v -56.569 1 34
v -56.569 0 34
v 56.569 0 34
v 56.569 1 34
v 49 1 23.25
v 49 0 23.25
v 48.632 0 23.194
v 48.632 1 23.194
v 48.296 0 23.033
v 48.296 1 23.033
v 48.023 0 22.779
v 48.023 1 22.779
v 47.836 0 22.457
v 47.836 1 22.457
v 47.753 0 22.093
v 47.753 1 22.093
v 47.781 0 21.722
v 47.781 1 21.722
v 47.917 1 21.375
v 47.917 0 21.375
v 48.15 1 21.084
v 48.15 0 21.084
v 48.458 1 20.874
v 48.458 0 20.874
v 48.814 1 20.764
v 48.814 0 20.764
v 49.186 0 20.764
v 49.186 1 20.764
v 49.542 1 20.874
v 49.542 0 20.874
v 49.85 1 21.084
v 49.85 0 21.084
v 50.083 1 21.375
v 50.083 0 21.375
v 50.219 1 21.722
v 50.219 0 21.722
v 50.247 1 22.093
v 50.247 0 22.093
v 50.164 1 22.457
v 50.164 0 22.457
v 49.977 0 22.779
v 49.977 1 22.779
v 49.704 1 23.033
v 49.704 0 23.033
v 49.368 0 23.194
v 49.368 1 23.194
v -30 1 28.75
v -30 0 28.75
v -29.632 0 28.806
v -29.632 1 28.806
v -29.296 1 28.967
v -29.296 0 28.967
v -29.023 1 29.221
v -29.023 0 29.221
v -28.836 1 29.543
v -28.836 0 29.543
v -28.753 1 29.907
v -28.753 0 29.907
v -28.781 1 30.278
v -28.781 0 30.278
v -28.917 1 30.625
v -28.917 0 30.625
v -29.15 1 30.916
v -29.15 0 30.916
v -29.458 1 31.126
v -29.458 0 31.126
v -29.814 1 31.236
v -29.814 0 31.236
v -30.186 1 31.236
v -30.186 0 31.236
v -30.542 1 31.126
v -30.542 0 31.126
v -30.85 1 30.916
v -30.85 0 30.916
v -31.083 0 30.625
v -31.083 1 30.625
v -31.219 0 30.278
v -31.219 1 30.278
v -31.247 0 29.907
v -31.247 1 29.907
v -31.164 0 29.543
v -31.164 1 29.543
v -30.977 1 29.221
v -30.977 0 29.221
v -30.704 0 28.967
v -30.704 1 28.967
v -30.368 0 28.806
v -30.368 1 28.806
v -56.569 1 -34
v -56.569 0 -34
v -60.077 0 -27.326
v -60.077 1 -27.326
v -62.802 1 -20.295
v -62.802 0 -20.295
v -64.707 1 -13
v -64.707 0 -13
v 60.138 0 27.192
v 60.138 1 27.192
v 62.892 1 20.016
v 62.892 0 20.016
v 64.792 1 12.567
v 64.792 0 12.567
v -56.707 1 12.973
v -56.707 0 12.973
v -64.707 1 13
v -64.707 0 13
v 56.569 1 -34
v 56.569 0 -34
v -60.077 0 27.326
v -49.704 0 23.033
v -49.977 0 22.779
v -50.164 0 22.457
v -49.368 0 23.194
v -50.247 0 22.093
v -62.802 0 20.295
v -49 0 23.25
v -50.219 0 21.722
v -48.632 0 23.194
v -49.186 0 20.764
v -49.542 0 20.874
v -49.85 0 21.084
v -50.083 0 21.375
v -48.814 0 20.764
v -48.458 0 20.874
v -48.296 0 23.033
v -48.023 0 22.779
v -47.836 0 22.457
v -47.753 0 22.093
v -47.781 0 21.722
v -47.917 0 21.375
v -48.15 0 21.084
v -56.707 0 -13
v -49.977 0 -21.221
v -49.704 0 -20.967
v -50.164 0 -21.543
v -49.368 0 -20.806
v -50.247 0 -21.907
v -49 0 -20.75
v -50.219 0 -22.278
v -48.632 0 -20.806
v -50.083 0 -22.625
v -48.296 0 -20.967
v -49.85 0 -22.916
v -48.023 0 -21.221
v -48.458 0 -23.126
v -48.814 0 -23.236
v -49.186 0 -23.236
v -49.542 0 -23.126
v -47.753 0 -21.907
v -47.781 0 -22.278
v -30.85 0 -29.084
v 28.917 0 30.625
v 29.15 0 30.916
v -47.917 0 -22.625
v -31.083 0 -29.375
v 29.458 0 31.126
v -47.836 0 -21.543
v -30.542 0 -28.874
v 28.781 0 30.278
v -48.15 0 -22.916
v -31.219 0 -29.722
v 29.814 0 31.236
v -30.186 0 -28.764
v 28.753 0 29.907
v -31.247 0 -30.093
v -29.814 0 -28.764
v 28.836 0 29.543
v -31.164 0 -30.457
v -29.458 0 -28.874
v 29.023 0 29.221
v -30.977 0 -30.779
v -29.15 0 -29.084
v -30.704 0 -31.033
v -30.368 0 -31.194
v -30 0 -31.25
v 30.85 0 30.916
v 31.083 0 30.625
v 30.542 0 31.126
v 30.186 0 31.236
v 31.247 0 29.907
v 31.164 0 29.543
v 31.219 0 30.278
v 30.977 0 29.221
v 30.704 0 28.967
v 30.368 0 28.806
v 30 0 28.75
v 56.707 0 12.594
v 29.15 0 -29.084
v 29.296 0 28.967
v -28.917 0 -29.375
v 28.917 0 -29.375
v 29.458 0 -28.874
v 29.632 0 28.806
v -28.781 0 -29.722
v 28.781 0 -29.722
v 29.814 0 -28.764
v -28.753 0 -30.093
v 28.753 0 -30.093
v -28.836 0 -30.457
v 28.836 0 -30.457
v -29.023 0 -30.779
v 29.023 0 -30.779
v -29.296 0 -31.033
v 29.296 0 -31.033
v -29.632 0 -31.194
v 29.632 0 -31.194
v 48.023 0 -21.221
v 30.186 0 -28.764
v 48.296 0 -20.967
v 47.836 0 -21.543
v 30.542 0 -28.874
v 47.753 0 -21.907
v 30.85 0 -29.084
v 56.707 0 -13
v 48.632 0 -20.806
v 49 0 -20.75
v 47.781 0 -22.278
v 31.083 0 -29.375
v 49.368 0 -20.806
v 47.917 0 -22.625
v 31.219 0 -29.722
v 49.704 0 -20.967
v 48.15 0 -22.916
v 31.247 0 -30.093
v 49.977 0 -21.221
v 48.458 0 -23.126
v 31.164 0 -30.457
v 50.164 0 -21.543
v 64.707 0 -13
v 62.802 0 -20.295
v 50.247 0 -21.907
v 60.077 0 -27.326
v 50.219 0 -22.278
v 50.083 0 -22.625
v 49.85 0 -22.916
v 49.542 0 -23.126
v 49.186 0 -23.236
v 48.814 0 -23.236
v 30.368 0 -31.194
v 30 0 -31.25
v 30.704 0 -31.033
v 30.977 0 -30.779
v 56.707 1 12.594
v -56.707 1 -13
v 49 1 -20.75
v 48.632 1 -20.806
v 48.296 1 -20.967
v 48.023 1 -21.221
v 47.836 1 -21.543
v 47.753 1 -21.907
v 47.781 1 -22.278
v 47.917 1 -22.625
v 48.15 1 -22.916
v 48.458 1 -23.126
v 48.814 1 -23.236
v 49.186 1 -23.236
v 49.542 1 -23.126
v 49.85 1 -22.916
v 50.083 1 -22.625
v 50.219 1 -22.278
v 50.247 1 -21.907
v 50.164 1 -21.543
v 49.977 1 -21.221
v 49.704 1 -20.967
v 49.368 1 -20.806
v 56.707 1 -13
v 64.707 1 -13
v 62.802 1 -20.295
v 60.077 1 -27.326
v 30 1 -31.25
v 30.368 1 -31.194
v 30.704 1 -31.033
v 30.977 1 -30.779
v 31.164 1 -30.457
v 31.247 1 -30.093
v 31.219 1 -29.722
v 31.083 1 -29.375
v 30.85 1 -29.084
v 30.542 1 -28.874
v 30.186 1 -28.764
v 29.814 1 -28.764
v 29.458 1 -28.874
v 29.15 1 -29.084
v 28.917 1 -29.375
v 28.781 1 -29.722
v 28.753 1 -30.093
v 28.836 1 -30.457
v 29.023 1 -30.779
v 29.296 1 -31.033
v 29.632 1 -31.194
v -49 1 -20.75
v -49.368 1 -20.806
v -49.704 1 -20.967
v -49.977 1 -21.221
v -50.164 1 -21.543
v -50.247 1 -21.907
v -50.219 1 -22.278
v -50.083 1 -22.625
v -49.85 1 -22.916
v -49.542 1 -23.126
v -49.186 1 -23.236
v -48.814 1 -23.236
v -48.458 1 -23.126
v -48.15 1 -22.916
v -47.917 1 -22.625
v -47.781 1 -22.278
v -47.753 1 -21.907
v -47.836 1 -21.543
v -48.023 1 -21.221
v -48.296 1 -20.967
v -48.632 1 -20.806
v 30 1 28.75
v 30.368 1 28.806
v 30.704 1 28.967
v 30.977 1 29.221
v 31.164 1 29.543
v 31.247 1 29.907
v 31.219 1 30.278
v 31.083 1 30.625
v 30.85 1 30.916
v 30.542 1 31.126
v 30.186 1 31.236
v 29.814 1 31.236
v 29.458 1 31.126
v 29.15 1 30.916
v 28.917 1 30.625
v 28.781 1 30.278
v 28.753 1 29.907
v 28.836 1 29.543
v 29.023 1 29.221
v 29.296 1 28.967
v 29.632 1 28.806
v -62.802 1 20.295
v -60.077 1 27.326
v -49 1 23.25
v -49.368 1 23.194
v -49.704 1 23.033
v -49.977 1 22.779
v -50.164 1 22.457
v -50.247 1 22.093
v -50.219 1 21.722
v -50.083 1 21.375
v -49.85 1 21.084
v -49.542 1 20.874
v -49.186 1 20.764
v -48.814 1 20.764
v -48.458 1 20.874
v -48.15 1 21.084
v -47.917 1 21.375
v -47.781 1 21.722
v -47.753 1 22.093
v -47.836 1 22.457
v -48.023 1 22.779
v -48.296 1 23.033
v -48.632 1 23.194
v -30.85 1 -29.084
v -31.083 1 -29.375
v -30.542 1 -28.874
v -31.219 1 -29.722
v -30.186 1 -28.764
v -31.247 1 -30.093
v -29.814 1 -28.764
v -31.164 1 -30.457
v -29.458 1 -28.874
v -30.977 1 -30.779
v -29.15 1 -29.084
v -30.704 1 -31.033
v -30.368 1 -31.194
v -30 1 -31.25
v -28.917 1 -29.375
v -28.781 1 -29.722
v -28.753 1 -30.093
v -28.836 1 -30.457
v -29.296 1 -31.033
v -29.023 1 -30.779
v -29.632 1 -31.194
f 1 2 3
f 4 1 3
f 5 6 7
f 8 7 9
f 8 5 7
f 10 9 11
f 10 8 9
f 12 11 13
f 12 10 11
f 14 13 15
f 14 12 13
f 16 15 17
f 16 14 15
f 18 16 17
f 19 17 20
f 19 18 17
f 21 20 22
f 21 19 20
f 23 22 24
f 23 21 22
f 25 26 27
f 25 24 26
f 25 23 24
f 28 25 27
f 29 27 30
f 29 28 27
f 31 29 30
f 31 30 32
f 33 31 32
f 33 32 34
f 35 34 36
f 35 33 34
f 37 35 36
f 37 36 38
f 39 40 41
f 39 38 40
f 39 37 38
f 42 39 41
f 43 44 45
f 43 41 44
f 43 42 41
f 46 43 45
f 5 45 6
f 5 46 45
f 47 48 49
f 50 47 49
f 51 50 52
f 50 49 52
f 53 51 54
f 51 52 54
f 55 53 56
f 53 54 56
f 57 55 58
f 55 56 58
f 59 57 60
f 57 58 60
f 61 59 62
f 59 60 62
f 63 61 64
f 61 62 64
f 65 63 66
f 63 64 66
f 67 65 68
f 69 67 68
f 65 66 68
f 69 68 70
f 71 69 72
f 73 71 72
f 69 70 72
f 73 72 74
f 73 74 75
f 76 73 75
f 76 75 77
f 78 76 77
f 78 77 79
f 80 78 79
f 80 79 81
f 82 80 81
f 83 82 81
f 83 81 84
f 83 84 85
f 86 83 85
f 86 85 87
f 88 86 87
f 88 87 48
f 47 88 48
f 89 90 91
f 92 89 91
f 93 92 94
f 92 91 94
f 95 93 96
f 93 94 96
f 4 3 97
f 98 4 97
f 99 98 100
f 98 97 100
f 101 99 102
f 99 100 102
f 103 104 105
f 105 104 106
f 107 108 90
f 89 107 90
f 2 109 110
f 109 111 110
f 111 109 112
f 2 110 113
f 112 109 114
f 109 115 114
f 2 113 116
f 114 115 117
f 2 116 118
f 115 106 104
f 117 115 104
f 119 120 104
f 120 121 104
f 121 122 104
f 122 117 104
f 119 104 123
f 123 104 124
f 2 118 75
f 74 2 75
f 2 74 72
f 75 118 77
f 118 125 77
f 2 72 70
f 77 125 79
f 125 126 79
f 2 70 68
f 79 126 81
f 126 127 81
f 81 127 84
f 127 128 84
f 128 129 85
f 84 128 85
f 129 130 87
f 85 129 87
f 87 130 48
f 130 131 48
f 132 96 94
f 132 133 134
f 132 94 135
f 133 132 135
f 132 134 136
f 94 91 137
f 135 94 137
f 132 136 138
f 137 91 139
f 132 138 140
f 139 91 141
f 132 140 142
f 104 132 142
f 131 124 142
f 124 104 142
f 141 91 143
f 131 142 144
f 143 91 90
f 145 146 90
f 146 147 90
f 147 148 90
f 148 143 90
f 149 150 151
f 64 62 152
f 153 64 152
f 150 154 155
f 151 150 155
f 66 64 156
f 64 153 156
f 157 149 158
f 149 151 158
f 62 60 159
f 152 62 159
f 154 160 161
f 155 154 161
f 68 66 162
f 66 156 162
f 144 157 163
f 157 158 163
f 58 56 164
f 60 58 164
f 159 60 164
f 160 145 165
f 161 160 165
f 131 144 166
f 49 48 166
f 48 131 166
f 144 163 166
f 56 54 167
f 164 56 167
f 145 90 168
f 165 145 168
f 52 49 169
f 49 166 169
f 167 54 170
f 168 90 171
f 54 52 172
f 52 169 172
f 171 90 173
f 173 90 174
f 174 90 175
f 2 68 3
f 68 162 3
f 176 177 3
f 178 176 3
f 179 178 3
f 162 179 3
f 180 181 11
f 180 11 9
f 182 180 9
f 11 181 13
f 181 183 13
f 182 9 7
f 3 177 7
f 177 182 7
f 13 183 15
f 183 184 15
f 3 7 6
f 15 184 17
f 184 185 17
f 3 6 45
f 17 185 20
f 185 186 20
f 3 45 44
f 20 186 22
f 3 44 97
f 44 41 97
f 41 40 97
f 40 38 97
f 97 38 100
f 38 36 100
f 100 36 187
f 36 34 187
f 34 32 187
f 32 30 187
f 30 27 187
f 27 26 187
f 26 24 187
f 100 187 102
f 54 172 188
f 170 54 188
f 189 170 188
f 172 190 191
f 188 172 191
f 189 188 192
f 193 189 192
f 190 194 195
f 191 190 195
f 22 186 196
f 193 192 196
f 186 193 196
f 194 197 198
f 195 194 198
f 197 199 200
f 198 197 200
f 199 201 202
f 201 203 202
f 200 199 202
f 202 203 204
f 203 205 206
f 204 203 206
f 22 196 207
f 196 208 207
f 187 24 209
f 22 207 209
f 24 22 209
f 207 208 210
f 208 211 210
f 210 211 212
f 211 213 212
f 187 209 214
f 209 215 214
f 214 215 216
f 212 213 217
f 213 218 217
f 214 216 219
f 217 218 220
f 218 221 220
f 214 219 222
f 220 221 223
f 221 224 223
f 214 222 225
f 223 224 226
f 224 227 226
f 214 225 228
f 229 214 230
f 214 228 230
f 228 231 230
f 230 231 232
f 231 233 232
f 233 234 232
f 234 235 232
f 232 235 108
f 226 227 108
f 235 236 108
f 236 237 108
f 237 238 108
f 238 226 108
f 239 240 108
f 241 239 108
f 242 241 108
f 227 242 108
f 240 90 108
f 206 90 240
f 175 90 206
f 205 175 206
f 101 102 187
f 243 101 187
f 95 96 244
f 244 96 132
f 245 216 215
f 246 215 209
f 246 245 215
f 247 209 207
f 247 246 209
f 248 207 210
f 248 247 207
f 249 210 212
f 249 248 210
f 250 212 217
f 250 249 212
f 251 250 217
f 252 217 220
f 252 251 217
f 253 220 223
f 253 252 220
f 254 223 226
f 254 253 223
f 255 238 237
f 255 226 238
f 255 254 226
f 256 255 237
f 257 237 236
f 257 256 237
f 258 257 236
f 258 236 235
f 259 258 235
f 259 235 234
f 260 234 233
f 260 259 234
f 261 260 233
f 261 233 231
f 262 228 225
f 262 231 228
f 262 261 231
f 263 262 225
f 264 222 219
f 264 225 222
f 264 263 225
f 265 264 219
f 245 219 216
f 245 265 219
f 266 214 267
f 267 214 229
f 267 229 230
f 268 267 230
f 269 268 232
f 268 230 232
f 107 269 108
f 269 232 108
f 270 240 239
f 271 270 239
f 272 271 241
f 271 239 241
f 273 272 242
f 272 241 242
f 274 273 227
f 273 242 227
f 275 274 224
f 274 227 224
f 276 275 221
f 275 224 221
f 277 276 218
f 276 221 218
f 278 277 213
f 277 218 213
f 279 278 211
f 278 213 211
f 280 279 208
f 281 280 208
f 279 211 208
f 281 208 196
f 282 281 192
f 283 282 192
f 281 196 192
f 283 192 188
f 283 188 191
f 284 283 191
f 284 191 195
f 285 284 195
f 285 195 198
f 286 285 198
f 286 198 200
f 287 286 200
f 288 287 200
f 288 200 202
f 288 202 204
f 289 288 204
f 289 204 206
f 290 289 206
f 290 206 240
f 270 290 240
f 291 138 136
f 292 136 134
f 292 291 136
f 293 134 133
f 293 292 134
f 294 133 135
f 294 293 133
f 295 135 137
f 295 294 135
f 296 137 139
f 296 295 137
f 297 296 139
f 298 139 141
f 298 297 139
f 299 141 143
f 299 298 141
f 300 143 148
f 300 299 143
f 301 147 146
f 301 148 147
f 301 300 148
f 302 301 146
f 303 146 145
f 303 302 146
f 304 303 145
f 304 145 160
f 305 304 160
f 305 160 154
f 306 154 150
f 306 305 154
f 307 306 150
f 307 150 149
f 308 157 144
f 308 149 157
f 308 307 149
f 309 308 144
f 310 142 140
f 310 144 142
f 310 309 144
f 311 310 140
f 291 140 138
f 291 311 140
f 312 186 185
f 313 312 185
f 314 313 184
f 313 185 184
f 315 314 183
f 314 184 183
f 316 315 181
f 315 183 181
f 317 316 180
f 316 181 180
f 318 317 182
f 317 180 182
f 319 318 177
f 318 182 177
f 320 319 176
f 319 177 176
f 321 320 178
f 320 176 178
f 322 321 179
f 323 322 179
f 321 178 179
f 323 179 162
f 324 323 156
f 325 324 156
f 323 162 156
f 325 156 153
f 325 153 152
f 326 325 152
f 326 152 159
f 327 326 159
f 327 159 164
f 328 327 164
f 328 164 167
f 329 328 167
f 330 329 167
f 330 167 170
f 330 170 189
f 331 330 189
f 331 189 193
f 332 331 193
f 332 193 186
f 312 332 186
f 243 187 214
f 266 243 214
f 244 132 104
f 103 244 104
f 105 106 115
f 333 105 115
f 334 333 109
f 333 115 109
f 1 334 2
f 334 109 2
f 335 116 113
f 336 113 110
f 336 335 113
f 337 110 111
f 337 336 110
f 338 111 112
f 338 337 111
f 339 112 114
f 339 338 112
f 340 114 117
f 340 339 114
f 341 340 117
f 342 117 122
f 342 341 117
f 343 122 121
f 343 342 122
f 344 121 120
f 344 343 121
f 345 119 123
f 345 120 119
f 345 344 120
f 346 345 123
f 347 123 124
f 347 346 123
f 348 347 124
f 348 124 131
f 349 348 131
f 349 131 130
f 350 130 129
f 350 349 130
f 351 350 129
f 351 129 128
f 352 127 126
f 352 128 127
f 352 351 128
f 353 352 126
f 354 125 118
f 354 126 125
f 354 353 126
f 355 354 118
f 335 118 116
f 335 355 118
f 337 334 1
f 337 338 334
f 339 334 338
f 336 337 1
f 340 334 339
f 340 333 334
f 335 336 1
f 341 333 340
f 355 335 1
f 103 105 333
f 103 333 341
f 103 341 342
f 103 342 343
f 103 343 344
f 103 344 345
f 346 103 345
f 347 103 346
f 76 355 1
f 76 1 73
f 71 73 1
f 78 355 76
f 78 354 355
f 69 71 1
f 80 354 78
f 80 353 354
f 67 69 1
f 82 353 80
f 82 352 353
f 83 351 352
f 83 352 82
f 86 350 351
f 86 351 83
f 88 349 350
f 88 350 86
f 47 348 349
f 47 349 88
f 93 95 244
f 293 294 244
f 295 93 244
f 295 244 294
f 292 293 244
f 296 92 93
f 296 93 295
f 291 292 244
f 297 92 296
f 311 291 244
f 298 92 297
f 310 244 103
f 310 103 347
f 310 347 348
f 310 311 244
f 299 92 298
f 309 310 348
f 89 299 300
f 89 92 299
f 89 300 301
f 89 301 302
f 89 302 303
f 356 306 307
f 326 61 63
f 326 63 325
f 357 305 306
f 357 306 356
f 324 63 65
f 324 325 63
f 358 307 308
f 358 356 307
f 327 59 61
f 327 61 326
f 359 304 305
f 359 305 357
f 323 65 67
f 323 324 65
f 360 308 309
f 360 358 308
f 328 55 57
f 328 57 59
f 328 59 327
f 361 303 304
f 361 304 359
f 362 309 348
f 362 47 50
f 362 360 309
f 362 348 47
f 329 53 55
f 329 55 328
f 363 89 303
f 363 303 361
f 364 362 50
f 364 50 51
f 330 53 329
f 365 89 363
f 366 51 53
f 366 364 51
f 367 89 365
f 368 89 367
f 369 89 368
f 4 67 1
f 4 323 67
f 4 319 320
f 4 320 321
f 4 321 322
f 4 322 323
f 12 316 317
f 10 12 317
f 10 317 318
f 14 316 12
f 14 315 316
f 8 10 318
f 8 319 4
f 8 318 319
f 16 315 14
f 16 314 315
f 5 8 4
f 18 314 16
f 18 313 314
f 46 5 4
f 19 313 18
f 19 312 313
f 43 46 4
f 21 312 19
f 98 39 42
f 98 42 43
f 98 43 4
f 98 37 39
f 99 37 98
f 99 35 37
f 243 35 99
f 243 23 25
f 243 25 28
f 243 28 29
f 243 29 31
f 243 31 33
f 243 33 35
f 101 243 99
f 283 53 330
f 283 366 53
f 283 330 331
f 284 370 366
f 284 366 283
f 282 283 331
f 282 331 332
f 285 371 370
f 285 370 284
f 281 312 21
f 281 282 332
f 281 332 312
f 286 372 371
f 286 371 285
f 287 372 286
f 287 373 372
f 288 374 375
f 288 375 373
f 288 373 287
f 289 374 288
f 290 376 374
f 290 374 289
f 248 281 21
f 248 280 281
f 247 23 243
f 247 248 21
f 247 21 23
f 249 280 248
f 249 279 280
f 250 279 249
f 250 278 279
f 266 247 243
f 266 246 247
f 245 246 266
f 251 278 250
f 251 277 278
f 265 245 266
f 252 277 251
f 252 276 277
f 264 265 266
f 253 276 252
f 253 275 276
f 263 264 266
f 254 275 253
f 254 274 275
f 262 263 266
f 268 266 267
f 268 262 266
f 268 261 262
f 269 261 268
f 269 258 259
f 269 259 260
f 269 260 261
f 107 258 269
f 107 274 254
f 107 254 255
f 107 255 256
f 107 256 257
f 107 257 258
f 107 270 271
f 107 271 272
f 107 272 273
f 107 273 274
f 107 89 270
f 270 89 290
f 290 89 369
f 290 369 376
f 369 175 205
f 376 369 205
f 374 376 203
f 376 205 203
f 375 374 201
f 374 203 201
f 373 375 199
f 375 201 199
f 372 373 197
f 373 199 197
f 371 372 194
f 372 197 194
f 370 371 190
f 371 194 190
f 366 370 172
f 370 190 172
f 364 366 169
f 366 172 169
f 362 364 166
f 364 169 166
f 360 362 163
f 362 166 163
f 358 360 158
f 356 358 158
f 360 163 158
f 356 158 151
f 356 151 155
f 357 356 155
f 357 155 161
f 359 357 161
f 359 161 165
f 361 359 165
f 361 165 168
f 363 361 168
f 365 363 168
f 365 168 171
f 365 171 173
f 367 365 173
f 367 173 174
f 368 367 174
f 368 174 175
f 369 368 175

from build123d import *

# Parameters (mm, degrees)
EXTRUDE_2_DEPTH             = 1
M3X0_5_1_D                  = 2.5
M3X0_5_1_DEPTH              = 4
M3X0_5_1_TIP                = 0.751075774
M3X0_5_1_ON_FACE_2_D        = 2.5
M3X0_5_1_ON_FACE_2_DEPTH    = 4
M3X0_5_1_ON_FACE_2_TIP      = 0.751075774
PATTERN_LINEAR_1_COUNT      = 2
PATTERN_LINEAR_1_PITCH      = 98
PATTERN_LINEAR_1_COUNT_DIR2 = 2
PATTERN_LINEAR_1_PITCH_DIR2 = 44


with BuildPart() as part:
    # 草圖10 → 填料-伸長2 (new body)
    with BuildSketch(Plane(origin=(0, 0, 0), x_dir=(1, 0, 0), z_dir=(0, 1, 0))):
        with BuildLine():
            Line((56.568542495, 34), (-56.568542495, 34))
            ThreePointArc((-56.568542495, 34), (-61.540159626, 23.849711805), (-64.707032075, 13))
            Line((-64.707032075, 13), (-56.707032075, 13))
            Line((-56.707032075, 13), (-56.707032075, -12.973279994))
            Line((-56.707032075, -12.973279994), (-64.707032075, -13))
            ThreePointArc((-64.707032075, -13), (-61.540159626, -23.849711805), (-56.568542495, -34))
            Line((-56.568542495, -34), (56.568542495, -34))
            ThreePointArc((56.568542495, -34), (61.619473981, -23.644035746), (64.792427449, -12.567471713))
            Line((64.792427449, -12.567471713), (56.707032075, -12.594476939))
            Line((56.707032075, -12.594476939), (56.707032075, 13))
            Line((56.707032075, 13), (64.707032075, 13))
            ThreePointArc((64.707032075, 13), (61.540159626, 23.849711805), (56.568542495, 34))
        make_face()
    extrude(amount=EXTRUDE_2_DEPTH)

    # M3x0.5  螺絲攻的螺孔鑽1
    with Locations(Plane(origin=(30, 1, 30), x_dir=(0, 0, 1), z_dir=(0, 1, 0))):
        with Locations((0, 0), (-60, -60), (0, -60), (-60, 0)):
            Hole(M3X0_5_1_D / 2, depth=M3X0_5_1_DEPTH)
            with Locations((0, 0, -(M3X0_5_1_DEPTH + M3X0_5_1_TIP / 2))):  # 118° drill point
                Cone(0, M3X0_5_1_D / 2, M3X0_5_1_TIP, mode=Mode.SUBTRACT)

    # M3x0.5  螺絲攻的螺孔鑽1 on face 2
    with Locations(Plane(origin=(-30, 0, -30), x_dir=(0, 0, -1), z_dir=(0, -1, 0))):
        with Locations((0, 0)):
            Hole(M3X0_5_1_ON_FACE_2_D / 2, depth=M3X0_5_1_ON_FACE_2_DEPTH)
            with Locations((0, 0, -(M3X0_5_1_ON_FACE_2_DEPTH + M3X0_5_1_ON_FACE_2_TIP / 2))):  # 118° drill point
                Cone(0, M3X0_5_1_ON_FACE_2_D / 2, M3X0_5_1_ON_FACE_2_TIP, mode=Mode.SUBTRACT)

    # 草圖14 → M3x0.5  螺絲攻的螺孔鑽2 (revolve, cut)
    with BuildSketch(Plane(origin=(-49, 1, -22), x_dir=(0, 0, 1), z_dir=(1, 0, 0))):
        Polygon((0, 0), (0, 4.751075774), (1.25, 4), (1.25, 0), align=None)
    m3x0_5_2 = revolve(axis=Axis((-49, 7.35, -22), (0, -1, 0)), mode=Mode.SUBTRACT)

    # 直線複製排列1: M3x0.5 _2 2 × 2
    with Locations(*[(i * PATTERN_LINEAR_1_PITCH, 0, j * PATTERN_LINEAR_1_PITCH_DIR2) for i in range(PATTERN_LINEAR_1_COUNT) for j in range(PATTERN_LINEAR_1_COUNT_DIR2) if (i, j) != (0, 0)]):
        add(m3x0_5_2, mode=Mode.SUBTRACT)


solid = part.part
